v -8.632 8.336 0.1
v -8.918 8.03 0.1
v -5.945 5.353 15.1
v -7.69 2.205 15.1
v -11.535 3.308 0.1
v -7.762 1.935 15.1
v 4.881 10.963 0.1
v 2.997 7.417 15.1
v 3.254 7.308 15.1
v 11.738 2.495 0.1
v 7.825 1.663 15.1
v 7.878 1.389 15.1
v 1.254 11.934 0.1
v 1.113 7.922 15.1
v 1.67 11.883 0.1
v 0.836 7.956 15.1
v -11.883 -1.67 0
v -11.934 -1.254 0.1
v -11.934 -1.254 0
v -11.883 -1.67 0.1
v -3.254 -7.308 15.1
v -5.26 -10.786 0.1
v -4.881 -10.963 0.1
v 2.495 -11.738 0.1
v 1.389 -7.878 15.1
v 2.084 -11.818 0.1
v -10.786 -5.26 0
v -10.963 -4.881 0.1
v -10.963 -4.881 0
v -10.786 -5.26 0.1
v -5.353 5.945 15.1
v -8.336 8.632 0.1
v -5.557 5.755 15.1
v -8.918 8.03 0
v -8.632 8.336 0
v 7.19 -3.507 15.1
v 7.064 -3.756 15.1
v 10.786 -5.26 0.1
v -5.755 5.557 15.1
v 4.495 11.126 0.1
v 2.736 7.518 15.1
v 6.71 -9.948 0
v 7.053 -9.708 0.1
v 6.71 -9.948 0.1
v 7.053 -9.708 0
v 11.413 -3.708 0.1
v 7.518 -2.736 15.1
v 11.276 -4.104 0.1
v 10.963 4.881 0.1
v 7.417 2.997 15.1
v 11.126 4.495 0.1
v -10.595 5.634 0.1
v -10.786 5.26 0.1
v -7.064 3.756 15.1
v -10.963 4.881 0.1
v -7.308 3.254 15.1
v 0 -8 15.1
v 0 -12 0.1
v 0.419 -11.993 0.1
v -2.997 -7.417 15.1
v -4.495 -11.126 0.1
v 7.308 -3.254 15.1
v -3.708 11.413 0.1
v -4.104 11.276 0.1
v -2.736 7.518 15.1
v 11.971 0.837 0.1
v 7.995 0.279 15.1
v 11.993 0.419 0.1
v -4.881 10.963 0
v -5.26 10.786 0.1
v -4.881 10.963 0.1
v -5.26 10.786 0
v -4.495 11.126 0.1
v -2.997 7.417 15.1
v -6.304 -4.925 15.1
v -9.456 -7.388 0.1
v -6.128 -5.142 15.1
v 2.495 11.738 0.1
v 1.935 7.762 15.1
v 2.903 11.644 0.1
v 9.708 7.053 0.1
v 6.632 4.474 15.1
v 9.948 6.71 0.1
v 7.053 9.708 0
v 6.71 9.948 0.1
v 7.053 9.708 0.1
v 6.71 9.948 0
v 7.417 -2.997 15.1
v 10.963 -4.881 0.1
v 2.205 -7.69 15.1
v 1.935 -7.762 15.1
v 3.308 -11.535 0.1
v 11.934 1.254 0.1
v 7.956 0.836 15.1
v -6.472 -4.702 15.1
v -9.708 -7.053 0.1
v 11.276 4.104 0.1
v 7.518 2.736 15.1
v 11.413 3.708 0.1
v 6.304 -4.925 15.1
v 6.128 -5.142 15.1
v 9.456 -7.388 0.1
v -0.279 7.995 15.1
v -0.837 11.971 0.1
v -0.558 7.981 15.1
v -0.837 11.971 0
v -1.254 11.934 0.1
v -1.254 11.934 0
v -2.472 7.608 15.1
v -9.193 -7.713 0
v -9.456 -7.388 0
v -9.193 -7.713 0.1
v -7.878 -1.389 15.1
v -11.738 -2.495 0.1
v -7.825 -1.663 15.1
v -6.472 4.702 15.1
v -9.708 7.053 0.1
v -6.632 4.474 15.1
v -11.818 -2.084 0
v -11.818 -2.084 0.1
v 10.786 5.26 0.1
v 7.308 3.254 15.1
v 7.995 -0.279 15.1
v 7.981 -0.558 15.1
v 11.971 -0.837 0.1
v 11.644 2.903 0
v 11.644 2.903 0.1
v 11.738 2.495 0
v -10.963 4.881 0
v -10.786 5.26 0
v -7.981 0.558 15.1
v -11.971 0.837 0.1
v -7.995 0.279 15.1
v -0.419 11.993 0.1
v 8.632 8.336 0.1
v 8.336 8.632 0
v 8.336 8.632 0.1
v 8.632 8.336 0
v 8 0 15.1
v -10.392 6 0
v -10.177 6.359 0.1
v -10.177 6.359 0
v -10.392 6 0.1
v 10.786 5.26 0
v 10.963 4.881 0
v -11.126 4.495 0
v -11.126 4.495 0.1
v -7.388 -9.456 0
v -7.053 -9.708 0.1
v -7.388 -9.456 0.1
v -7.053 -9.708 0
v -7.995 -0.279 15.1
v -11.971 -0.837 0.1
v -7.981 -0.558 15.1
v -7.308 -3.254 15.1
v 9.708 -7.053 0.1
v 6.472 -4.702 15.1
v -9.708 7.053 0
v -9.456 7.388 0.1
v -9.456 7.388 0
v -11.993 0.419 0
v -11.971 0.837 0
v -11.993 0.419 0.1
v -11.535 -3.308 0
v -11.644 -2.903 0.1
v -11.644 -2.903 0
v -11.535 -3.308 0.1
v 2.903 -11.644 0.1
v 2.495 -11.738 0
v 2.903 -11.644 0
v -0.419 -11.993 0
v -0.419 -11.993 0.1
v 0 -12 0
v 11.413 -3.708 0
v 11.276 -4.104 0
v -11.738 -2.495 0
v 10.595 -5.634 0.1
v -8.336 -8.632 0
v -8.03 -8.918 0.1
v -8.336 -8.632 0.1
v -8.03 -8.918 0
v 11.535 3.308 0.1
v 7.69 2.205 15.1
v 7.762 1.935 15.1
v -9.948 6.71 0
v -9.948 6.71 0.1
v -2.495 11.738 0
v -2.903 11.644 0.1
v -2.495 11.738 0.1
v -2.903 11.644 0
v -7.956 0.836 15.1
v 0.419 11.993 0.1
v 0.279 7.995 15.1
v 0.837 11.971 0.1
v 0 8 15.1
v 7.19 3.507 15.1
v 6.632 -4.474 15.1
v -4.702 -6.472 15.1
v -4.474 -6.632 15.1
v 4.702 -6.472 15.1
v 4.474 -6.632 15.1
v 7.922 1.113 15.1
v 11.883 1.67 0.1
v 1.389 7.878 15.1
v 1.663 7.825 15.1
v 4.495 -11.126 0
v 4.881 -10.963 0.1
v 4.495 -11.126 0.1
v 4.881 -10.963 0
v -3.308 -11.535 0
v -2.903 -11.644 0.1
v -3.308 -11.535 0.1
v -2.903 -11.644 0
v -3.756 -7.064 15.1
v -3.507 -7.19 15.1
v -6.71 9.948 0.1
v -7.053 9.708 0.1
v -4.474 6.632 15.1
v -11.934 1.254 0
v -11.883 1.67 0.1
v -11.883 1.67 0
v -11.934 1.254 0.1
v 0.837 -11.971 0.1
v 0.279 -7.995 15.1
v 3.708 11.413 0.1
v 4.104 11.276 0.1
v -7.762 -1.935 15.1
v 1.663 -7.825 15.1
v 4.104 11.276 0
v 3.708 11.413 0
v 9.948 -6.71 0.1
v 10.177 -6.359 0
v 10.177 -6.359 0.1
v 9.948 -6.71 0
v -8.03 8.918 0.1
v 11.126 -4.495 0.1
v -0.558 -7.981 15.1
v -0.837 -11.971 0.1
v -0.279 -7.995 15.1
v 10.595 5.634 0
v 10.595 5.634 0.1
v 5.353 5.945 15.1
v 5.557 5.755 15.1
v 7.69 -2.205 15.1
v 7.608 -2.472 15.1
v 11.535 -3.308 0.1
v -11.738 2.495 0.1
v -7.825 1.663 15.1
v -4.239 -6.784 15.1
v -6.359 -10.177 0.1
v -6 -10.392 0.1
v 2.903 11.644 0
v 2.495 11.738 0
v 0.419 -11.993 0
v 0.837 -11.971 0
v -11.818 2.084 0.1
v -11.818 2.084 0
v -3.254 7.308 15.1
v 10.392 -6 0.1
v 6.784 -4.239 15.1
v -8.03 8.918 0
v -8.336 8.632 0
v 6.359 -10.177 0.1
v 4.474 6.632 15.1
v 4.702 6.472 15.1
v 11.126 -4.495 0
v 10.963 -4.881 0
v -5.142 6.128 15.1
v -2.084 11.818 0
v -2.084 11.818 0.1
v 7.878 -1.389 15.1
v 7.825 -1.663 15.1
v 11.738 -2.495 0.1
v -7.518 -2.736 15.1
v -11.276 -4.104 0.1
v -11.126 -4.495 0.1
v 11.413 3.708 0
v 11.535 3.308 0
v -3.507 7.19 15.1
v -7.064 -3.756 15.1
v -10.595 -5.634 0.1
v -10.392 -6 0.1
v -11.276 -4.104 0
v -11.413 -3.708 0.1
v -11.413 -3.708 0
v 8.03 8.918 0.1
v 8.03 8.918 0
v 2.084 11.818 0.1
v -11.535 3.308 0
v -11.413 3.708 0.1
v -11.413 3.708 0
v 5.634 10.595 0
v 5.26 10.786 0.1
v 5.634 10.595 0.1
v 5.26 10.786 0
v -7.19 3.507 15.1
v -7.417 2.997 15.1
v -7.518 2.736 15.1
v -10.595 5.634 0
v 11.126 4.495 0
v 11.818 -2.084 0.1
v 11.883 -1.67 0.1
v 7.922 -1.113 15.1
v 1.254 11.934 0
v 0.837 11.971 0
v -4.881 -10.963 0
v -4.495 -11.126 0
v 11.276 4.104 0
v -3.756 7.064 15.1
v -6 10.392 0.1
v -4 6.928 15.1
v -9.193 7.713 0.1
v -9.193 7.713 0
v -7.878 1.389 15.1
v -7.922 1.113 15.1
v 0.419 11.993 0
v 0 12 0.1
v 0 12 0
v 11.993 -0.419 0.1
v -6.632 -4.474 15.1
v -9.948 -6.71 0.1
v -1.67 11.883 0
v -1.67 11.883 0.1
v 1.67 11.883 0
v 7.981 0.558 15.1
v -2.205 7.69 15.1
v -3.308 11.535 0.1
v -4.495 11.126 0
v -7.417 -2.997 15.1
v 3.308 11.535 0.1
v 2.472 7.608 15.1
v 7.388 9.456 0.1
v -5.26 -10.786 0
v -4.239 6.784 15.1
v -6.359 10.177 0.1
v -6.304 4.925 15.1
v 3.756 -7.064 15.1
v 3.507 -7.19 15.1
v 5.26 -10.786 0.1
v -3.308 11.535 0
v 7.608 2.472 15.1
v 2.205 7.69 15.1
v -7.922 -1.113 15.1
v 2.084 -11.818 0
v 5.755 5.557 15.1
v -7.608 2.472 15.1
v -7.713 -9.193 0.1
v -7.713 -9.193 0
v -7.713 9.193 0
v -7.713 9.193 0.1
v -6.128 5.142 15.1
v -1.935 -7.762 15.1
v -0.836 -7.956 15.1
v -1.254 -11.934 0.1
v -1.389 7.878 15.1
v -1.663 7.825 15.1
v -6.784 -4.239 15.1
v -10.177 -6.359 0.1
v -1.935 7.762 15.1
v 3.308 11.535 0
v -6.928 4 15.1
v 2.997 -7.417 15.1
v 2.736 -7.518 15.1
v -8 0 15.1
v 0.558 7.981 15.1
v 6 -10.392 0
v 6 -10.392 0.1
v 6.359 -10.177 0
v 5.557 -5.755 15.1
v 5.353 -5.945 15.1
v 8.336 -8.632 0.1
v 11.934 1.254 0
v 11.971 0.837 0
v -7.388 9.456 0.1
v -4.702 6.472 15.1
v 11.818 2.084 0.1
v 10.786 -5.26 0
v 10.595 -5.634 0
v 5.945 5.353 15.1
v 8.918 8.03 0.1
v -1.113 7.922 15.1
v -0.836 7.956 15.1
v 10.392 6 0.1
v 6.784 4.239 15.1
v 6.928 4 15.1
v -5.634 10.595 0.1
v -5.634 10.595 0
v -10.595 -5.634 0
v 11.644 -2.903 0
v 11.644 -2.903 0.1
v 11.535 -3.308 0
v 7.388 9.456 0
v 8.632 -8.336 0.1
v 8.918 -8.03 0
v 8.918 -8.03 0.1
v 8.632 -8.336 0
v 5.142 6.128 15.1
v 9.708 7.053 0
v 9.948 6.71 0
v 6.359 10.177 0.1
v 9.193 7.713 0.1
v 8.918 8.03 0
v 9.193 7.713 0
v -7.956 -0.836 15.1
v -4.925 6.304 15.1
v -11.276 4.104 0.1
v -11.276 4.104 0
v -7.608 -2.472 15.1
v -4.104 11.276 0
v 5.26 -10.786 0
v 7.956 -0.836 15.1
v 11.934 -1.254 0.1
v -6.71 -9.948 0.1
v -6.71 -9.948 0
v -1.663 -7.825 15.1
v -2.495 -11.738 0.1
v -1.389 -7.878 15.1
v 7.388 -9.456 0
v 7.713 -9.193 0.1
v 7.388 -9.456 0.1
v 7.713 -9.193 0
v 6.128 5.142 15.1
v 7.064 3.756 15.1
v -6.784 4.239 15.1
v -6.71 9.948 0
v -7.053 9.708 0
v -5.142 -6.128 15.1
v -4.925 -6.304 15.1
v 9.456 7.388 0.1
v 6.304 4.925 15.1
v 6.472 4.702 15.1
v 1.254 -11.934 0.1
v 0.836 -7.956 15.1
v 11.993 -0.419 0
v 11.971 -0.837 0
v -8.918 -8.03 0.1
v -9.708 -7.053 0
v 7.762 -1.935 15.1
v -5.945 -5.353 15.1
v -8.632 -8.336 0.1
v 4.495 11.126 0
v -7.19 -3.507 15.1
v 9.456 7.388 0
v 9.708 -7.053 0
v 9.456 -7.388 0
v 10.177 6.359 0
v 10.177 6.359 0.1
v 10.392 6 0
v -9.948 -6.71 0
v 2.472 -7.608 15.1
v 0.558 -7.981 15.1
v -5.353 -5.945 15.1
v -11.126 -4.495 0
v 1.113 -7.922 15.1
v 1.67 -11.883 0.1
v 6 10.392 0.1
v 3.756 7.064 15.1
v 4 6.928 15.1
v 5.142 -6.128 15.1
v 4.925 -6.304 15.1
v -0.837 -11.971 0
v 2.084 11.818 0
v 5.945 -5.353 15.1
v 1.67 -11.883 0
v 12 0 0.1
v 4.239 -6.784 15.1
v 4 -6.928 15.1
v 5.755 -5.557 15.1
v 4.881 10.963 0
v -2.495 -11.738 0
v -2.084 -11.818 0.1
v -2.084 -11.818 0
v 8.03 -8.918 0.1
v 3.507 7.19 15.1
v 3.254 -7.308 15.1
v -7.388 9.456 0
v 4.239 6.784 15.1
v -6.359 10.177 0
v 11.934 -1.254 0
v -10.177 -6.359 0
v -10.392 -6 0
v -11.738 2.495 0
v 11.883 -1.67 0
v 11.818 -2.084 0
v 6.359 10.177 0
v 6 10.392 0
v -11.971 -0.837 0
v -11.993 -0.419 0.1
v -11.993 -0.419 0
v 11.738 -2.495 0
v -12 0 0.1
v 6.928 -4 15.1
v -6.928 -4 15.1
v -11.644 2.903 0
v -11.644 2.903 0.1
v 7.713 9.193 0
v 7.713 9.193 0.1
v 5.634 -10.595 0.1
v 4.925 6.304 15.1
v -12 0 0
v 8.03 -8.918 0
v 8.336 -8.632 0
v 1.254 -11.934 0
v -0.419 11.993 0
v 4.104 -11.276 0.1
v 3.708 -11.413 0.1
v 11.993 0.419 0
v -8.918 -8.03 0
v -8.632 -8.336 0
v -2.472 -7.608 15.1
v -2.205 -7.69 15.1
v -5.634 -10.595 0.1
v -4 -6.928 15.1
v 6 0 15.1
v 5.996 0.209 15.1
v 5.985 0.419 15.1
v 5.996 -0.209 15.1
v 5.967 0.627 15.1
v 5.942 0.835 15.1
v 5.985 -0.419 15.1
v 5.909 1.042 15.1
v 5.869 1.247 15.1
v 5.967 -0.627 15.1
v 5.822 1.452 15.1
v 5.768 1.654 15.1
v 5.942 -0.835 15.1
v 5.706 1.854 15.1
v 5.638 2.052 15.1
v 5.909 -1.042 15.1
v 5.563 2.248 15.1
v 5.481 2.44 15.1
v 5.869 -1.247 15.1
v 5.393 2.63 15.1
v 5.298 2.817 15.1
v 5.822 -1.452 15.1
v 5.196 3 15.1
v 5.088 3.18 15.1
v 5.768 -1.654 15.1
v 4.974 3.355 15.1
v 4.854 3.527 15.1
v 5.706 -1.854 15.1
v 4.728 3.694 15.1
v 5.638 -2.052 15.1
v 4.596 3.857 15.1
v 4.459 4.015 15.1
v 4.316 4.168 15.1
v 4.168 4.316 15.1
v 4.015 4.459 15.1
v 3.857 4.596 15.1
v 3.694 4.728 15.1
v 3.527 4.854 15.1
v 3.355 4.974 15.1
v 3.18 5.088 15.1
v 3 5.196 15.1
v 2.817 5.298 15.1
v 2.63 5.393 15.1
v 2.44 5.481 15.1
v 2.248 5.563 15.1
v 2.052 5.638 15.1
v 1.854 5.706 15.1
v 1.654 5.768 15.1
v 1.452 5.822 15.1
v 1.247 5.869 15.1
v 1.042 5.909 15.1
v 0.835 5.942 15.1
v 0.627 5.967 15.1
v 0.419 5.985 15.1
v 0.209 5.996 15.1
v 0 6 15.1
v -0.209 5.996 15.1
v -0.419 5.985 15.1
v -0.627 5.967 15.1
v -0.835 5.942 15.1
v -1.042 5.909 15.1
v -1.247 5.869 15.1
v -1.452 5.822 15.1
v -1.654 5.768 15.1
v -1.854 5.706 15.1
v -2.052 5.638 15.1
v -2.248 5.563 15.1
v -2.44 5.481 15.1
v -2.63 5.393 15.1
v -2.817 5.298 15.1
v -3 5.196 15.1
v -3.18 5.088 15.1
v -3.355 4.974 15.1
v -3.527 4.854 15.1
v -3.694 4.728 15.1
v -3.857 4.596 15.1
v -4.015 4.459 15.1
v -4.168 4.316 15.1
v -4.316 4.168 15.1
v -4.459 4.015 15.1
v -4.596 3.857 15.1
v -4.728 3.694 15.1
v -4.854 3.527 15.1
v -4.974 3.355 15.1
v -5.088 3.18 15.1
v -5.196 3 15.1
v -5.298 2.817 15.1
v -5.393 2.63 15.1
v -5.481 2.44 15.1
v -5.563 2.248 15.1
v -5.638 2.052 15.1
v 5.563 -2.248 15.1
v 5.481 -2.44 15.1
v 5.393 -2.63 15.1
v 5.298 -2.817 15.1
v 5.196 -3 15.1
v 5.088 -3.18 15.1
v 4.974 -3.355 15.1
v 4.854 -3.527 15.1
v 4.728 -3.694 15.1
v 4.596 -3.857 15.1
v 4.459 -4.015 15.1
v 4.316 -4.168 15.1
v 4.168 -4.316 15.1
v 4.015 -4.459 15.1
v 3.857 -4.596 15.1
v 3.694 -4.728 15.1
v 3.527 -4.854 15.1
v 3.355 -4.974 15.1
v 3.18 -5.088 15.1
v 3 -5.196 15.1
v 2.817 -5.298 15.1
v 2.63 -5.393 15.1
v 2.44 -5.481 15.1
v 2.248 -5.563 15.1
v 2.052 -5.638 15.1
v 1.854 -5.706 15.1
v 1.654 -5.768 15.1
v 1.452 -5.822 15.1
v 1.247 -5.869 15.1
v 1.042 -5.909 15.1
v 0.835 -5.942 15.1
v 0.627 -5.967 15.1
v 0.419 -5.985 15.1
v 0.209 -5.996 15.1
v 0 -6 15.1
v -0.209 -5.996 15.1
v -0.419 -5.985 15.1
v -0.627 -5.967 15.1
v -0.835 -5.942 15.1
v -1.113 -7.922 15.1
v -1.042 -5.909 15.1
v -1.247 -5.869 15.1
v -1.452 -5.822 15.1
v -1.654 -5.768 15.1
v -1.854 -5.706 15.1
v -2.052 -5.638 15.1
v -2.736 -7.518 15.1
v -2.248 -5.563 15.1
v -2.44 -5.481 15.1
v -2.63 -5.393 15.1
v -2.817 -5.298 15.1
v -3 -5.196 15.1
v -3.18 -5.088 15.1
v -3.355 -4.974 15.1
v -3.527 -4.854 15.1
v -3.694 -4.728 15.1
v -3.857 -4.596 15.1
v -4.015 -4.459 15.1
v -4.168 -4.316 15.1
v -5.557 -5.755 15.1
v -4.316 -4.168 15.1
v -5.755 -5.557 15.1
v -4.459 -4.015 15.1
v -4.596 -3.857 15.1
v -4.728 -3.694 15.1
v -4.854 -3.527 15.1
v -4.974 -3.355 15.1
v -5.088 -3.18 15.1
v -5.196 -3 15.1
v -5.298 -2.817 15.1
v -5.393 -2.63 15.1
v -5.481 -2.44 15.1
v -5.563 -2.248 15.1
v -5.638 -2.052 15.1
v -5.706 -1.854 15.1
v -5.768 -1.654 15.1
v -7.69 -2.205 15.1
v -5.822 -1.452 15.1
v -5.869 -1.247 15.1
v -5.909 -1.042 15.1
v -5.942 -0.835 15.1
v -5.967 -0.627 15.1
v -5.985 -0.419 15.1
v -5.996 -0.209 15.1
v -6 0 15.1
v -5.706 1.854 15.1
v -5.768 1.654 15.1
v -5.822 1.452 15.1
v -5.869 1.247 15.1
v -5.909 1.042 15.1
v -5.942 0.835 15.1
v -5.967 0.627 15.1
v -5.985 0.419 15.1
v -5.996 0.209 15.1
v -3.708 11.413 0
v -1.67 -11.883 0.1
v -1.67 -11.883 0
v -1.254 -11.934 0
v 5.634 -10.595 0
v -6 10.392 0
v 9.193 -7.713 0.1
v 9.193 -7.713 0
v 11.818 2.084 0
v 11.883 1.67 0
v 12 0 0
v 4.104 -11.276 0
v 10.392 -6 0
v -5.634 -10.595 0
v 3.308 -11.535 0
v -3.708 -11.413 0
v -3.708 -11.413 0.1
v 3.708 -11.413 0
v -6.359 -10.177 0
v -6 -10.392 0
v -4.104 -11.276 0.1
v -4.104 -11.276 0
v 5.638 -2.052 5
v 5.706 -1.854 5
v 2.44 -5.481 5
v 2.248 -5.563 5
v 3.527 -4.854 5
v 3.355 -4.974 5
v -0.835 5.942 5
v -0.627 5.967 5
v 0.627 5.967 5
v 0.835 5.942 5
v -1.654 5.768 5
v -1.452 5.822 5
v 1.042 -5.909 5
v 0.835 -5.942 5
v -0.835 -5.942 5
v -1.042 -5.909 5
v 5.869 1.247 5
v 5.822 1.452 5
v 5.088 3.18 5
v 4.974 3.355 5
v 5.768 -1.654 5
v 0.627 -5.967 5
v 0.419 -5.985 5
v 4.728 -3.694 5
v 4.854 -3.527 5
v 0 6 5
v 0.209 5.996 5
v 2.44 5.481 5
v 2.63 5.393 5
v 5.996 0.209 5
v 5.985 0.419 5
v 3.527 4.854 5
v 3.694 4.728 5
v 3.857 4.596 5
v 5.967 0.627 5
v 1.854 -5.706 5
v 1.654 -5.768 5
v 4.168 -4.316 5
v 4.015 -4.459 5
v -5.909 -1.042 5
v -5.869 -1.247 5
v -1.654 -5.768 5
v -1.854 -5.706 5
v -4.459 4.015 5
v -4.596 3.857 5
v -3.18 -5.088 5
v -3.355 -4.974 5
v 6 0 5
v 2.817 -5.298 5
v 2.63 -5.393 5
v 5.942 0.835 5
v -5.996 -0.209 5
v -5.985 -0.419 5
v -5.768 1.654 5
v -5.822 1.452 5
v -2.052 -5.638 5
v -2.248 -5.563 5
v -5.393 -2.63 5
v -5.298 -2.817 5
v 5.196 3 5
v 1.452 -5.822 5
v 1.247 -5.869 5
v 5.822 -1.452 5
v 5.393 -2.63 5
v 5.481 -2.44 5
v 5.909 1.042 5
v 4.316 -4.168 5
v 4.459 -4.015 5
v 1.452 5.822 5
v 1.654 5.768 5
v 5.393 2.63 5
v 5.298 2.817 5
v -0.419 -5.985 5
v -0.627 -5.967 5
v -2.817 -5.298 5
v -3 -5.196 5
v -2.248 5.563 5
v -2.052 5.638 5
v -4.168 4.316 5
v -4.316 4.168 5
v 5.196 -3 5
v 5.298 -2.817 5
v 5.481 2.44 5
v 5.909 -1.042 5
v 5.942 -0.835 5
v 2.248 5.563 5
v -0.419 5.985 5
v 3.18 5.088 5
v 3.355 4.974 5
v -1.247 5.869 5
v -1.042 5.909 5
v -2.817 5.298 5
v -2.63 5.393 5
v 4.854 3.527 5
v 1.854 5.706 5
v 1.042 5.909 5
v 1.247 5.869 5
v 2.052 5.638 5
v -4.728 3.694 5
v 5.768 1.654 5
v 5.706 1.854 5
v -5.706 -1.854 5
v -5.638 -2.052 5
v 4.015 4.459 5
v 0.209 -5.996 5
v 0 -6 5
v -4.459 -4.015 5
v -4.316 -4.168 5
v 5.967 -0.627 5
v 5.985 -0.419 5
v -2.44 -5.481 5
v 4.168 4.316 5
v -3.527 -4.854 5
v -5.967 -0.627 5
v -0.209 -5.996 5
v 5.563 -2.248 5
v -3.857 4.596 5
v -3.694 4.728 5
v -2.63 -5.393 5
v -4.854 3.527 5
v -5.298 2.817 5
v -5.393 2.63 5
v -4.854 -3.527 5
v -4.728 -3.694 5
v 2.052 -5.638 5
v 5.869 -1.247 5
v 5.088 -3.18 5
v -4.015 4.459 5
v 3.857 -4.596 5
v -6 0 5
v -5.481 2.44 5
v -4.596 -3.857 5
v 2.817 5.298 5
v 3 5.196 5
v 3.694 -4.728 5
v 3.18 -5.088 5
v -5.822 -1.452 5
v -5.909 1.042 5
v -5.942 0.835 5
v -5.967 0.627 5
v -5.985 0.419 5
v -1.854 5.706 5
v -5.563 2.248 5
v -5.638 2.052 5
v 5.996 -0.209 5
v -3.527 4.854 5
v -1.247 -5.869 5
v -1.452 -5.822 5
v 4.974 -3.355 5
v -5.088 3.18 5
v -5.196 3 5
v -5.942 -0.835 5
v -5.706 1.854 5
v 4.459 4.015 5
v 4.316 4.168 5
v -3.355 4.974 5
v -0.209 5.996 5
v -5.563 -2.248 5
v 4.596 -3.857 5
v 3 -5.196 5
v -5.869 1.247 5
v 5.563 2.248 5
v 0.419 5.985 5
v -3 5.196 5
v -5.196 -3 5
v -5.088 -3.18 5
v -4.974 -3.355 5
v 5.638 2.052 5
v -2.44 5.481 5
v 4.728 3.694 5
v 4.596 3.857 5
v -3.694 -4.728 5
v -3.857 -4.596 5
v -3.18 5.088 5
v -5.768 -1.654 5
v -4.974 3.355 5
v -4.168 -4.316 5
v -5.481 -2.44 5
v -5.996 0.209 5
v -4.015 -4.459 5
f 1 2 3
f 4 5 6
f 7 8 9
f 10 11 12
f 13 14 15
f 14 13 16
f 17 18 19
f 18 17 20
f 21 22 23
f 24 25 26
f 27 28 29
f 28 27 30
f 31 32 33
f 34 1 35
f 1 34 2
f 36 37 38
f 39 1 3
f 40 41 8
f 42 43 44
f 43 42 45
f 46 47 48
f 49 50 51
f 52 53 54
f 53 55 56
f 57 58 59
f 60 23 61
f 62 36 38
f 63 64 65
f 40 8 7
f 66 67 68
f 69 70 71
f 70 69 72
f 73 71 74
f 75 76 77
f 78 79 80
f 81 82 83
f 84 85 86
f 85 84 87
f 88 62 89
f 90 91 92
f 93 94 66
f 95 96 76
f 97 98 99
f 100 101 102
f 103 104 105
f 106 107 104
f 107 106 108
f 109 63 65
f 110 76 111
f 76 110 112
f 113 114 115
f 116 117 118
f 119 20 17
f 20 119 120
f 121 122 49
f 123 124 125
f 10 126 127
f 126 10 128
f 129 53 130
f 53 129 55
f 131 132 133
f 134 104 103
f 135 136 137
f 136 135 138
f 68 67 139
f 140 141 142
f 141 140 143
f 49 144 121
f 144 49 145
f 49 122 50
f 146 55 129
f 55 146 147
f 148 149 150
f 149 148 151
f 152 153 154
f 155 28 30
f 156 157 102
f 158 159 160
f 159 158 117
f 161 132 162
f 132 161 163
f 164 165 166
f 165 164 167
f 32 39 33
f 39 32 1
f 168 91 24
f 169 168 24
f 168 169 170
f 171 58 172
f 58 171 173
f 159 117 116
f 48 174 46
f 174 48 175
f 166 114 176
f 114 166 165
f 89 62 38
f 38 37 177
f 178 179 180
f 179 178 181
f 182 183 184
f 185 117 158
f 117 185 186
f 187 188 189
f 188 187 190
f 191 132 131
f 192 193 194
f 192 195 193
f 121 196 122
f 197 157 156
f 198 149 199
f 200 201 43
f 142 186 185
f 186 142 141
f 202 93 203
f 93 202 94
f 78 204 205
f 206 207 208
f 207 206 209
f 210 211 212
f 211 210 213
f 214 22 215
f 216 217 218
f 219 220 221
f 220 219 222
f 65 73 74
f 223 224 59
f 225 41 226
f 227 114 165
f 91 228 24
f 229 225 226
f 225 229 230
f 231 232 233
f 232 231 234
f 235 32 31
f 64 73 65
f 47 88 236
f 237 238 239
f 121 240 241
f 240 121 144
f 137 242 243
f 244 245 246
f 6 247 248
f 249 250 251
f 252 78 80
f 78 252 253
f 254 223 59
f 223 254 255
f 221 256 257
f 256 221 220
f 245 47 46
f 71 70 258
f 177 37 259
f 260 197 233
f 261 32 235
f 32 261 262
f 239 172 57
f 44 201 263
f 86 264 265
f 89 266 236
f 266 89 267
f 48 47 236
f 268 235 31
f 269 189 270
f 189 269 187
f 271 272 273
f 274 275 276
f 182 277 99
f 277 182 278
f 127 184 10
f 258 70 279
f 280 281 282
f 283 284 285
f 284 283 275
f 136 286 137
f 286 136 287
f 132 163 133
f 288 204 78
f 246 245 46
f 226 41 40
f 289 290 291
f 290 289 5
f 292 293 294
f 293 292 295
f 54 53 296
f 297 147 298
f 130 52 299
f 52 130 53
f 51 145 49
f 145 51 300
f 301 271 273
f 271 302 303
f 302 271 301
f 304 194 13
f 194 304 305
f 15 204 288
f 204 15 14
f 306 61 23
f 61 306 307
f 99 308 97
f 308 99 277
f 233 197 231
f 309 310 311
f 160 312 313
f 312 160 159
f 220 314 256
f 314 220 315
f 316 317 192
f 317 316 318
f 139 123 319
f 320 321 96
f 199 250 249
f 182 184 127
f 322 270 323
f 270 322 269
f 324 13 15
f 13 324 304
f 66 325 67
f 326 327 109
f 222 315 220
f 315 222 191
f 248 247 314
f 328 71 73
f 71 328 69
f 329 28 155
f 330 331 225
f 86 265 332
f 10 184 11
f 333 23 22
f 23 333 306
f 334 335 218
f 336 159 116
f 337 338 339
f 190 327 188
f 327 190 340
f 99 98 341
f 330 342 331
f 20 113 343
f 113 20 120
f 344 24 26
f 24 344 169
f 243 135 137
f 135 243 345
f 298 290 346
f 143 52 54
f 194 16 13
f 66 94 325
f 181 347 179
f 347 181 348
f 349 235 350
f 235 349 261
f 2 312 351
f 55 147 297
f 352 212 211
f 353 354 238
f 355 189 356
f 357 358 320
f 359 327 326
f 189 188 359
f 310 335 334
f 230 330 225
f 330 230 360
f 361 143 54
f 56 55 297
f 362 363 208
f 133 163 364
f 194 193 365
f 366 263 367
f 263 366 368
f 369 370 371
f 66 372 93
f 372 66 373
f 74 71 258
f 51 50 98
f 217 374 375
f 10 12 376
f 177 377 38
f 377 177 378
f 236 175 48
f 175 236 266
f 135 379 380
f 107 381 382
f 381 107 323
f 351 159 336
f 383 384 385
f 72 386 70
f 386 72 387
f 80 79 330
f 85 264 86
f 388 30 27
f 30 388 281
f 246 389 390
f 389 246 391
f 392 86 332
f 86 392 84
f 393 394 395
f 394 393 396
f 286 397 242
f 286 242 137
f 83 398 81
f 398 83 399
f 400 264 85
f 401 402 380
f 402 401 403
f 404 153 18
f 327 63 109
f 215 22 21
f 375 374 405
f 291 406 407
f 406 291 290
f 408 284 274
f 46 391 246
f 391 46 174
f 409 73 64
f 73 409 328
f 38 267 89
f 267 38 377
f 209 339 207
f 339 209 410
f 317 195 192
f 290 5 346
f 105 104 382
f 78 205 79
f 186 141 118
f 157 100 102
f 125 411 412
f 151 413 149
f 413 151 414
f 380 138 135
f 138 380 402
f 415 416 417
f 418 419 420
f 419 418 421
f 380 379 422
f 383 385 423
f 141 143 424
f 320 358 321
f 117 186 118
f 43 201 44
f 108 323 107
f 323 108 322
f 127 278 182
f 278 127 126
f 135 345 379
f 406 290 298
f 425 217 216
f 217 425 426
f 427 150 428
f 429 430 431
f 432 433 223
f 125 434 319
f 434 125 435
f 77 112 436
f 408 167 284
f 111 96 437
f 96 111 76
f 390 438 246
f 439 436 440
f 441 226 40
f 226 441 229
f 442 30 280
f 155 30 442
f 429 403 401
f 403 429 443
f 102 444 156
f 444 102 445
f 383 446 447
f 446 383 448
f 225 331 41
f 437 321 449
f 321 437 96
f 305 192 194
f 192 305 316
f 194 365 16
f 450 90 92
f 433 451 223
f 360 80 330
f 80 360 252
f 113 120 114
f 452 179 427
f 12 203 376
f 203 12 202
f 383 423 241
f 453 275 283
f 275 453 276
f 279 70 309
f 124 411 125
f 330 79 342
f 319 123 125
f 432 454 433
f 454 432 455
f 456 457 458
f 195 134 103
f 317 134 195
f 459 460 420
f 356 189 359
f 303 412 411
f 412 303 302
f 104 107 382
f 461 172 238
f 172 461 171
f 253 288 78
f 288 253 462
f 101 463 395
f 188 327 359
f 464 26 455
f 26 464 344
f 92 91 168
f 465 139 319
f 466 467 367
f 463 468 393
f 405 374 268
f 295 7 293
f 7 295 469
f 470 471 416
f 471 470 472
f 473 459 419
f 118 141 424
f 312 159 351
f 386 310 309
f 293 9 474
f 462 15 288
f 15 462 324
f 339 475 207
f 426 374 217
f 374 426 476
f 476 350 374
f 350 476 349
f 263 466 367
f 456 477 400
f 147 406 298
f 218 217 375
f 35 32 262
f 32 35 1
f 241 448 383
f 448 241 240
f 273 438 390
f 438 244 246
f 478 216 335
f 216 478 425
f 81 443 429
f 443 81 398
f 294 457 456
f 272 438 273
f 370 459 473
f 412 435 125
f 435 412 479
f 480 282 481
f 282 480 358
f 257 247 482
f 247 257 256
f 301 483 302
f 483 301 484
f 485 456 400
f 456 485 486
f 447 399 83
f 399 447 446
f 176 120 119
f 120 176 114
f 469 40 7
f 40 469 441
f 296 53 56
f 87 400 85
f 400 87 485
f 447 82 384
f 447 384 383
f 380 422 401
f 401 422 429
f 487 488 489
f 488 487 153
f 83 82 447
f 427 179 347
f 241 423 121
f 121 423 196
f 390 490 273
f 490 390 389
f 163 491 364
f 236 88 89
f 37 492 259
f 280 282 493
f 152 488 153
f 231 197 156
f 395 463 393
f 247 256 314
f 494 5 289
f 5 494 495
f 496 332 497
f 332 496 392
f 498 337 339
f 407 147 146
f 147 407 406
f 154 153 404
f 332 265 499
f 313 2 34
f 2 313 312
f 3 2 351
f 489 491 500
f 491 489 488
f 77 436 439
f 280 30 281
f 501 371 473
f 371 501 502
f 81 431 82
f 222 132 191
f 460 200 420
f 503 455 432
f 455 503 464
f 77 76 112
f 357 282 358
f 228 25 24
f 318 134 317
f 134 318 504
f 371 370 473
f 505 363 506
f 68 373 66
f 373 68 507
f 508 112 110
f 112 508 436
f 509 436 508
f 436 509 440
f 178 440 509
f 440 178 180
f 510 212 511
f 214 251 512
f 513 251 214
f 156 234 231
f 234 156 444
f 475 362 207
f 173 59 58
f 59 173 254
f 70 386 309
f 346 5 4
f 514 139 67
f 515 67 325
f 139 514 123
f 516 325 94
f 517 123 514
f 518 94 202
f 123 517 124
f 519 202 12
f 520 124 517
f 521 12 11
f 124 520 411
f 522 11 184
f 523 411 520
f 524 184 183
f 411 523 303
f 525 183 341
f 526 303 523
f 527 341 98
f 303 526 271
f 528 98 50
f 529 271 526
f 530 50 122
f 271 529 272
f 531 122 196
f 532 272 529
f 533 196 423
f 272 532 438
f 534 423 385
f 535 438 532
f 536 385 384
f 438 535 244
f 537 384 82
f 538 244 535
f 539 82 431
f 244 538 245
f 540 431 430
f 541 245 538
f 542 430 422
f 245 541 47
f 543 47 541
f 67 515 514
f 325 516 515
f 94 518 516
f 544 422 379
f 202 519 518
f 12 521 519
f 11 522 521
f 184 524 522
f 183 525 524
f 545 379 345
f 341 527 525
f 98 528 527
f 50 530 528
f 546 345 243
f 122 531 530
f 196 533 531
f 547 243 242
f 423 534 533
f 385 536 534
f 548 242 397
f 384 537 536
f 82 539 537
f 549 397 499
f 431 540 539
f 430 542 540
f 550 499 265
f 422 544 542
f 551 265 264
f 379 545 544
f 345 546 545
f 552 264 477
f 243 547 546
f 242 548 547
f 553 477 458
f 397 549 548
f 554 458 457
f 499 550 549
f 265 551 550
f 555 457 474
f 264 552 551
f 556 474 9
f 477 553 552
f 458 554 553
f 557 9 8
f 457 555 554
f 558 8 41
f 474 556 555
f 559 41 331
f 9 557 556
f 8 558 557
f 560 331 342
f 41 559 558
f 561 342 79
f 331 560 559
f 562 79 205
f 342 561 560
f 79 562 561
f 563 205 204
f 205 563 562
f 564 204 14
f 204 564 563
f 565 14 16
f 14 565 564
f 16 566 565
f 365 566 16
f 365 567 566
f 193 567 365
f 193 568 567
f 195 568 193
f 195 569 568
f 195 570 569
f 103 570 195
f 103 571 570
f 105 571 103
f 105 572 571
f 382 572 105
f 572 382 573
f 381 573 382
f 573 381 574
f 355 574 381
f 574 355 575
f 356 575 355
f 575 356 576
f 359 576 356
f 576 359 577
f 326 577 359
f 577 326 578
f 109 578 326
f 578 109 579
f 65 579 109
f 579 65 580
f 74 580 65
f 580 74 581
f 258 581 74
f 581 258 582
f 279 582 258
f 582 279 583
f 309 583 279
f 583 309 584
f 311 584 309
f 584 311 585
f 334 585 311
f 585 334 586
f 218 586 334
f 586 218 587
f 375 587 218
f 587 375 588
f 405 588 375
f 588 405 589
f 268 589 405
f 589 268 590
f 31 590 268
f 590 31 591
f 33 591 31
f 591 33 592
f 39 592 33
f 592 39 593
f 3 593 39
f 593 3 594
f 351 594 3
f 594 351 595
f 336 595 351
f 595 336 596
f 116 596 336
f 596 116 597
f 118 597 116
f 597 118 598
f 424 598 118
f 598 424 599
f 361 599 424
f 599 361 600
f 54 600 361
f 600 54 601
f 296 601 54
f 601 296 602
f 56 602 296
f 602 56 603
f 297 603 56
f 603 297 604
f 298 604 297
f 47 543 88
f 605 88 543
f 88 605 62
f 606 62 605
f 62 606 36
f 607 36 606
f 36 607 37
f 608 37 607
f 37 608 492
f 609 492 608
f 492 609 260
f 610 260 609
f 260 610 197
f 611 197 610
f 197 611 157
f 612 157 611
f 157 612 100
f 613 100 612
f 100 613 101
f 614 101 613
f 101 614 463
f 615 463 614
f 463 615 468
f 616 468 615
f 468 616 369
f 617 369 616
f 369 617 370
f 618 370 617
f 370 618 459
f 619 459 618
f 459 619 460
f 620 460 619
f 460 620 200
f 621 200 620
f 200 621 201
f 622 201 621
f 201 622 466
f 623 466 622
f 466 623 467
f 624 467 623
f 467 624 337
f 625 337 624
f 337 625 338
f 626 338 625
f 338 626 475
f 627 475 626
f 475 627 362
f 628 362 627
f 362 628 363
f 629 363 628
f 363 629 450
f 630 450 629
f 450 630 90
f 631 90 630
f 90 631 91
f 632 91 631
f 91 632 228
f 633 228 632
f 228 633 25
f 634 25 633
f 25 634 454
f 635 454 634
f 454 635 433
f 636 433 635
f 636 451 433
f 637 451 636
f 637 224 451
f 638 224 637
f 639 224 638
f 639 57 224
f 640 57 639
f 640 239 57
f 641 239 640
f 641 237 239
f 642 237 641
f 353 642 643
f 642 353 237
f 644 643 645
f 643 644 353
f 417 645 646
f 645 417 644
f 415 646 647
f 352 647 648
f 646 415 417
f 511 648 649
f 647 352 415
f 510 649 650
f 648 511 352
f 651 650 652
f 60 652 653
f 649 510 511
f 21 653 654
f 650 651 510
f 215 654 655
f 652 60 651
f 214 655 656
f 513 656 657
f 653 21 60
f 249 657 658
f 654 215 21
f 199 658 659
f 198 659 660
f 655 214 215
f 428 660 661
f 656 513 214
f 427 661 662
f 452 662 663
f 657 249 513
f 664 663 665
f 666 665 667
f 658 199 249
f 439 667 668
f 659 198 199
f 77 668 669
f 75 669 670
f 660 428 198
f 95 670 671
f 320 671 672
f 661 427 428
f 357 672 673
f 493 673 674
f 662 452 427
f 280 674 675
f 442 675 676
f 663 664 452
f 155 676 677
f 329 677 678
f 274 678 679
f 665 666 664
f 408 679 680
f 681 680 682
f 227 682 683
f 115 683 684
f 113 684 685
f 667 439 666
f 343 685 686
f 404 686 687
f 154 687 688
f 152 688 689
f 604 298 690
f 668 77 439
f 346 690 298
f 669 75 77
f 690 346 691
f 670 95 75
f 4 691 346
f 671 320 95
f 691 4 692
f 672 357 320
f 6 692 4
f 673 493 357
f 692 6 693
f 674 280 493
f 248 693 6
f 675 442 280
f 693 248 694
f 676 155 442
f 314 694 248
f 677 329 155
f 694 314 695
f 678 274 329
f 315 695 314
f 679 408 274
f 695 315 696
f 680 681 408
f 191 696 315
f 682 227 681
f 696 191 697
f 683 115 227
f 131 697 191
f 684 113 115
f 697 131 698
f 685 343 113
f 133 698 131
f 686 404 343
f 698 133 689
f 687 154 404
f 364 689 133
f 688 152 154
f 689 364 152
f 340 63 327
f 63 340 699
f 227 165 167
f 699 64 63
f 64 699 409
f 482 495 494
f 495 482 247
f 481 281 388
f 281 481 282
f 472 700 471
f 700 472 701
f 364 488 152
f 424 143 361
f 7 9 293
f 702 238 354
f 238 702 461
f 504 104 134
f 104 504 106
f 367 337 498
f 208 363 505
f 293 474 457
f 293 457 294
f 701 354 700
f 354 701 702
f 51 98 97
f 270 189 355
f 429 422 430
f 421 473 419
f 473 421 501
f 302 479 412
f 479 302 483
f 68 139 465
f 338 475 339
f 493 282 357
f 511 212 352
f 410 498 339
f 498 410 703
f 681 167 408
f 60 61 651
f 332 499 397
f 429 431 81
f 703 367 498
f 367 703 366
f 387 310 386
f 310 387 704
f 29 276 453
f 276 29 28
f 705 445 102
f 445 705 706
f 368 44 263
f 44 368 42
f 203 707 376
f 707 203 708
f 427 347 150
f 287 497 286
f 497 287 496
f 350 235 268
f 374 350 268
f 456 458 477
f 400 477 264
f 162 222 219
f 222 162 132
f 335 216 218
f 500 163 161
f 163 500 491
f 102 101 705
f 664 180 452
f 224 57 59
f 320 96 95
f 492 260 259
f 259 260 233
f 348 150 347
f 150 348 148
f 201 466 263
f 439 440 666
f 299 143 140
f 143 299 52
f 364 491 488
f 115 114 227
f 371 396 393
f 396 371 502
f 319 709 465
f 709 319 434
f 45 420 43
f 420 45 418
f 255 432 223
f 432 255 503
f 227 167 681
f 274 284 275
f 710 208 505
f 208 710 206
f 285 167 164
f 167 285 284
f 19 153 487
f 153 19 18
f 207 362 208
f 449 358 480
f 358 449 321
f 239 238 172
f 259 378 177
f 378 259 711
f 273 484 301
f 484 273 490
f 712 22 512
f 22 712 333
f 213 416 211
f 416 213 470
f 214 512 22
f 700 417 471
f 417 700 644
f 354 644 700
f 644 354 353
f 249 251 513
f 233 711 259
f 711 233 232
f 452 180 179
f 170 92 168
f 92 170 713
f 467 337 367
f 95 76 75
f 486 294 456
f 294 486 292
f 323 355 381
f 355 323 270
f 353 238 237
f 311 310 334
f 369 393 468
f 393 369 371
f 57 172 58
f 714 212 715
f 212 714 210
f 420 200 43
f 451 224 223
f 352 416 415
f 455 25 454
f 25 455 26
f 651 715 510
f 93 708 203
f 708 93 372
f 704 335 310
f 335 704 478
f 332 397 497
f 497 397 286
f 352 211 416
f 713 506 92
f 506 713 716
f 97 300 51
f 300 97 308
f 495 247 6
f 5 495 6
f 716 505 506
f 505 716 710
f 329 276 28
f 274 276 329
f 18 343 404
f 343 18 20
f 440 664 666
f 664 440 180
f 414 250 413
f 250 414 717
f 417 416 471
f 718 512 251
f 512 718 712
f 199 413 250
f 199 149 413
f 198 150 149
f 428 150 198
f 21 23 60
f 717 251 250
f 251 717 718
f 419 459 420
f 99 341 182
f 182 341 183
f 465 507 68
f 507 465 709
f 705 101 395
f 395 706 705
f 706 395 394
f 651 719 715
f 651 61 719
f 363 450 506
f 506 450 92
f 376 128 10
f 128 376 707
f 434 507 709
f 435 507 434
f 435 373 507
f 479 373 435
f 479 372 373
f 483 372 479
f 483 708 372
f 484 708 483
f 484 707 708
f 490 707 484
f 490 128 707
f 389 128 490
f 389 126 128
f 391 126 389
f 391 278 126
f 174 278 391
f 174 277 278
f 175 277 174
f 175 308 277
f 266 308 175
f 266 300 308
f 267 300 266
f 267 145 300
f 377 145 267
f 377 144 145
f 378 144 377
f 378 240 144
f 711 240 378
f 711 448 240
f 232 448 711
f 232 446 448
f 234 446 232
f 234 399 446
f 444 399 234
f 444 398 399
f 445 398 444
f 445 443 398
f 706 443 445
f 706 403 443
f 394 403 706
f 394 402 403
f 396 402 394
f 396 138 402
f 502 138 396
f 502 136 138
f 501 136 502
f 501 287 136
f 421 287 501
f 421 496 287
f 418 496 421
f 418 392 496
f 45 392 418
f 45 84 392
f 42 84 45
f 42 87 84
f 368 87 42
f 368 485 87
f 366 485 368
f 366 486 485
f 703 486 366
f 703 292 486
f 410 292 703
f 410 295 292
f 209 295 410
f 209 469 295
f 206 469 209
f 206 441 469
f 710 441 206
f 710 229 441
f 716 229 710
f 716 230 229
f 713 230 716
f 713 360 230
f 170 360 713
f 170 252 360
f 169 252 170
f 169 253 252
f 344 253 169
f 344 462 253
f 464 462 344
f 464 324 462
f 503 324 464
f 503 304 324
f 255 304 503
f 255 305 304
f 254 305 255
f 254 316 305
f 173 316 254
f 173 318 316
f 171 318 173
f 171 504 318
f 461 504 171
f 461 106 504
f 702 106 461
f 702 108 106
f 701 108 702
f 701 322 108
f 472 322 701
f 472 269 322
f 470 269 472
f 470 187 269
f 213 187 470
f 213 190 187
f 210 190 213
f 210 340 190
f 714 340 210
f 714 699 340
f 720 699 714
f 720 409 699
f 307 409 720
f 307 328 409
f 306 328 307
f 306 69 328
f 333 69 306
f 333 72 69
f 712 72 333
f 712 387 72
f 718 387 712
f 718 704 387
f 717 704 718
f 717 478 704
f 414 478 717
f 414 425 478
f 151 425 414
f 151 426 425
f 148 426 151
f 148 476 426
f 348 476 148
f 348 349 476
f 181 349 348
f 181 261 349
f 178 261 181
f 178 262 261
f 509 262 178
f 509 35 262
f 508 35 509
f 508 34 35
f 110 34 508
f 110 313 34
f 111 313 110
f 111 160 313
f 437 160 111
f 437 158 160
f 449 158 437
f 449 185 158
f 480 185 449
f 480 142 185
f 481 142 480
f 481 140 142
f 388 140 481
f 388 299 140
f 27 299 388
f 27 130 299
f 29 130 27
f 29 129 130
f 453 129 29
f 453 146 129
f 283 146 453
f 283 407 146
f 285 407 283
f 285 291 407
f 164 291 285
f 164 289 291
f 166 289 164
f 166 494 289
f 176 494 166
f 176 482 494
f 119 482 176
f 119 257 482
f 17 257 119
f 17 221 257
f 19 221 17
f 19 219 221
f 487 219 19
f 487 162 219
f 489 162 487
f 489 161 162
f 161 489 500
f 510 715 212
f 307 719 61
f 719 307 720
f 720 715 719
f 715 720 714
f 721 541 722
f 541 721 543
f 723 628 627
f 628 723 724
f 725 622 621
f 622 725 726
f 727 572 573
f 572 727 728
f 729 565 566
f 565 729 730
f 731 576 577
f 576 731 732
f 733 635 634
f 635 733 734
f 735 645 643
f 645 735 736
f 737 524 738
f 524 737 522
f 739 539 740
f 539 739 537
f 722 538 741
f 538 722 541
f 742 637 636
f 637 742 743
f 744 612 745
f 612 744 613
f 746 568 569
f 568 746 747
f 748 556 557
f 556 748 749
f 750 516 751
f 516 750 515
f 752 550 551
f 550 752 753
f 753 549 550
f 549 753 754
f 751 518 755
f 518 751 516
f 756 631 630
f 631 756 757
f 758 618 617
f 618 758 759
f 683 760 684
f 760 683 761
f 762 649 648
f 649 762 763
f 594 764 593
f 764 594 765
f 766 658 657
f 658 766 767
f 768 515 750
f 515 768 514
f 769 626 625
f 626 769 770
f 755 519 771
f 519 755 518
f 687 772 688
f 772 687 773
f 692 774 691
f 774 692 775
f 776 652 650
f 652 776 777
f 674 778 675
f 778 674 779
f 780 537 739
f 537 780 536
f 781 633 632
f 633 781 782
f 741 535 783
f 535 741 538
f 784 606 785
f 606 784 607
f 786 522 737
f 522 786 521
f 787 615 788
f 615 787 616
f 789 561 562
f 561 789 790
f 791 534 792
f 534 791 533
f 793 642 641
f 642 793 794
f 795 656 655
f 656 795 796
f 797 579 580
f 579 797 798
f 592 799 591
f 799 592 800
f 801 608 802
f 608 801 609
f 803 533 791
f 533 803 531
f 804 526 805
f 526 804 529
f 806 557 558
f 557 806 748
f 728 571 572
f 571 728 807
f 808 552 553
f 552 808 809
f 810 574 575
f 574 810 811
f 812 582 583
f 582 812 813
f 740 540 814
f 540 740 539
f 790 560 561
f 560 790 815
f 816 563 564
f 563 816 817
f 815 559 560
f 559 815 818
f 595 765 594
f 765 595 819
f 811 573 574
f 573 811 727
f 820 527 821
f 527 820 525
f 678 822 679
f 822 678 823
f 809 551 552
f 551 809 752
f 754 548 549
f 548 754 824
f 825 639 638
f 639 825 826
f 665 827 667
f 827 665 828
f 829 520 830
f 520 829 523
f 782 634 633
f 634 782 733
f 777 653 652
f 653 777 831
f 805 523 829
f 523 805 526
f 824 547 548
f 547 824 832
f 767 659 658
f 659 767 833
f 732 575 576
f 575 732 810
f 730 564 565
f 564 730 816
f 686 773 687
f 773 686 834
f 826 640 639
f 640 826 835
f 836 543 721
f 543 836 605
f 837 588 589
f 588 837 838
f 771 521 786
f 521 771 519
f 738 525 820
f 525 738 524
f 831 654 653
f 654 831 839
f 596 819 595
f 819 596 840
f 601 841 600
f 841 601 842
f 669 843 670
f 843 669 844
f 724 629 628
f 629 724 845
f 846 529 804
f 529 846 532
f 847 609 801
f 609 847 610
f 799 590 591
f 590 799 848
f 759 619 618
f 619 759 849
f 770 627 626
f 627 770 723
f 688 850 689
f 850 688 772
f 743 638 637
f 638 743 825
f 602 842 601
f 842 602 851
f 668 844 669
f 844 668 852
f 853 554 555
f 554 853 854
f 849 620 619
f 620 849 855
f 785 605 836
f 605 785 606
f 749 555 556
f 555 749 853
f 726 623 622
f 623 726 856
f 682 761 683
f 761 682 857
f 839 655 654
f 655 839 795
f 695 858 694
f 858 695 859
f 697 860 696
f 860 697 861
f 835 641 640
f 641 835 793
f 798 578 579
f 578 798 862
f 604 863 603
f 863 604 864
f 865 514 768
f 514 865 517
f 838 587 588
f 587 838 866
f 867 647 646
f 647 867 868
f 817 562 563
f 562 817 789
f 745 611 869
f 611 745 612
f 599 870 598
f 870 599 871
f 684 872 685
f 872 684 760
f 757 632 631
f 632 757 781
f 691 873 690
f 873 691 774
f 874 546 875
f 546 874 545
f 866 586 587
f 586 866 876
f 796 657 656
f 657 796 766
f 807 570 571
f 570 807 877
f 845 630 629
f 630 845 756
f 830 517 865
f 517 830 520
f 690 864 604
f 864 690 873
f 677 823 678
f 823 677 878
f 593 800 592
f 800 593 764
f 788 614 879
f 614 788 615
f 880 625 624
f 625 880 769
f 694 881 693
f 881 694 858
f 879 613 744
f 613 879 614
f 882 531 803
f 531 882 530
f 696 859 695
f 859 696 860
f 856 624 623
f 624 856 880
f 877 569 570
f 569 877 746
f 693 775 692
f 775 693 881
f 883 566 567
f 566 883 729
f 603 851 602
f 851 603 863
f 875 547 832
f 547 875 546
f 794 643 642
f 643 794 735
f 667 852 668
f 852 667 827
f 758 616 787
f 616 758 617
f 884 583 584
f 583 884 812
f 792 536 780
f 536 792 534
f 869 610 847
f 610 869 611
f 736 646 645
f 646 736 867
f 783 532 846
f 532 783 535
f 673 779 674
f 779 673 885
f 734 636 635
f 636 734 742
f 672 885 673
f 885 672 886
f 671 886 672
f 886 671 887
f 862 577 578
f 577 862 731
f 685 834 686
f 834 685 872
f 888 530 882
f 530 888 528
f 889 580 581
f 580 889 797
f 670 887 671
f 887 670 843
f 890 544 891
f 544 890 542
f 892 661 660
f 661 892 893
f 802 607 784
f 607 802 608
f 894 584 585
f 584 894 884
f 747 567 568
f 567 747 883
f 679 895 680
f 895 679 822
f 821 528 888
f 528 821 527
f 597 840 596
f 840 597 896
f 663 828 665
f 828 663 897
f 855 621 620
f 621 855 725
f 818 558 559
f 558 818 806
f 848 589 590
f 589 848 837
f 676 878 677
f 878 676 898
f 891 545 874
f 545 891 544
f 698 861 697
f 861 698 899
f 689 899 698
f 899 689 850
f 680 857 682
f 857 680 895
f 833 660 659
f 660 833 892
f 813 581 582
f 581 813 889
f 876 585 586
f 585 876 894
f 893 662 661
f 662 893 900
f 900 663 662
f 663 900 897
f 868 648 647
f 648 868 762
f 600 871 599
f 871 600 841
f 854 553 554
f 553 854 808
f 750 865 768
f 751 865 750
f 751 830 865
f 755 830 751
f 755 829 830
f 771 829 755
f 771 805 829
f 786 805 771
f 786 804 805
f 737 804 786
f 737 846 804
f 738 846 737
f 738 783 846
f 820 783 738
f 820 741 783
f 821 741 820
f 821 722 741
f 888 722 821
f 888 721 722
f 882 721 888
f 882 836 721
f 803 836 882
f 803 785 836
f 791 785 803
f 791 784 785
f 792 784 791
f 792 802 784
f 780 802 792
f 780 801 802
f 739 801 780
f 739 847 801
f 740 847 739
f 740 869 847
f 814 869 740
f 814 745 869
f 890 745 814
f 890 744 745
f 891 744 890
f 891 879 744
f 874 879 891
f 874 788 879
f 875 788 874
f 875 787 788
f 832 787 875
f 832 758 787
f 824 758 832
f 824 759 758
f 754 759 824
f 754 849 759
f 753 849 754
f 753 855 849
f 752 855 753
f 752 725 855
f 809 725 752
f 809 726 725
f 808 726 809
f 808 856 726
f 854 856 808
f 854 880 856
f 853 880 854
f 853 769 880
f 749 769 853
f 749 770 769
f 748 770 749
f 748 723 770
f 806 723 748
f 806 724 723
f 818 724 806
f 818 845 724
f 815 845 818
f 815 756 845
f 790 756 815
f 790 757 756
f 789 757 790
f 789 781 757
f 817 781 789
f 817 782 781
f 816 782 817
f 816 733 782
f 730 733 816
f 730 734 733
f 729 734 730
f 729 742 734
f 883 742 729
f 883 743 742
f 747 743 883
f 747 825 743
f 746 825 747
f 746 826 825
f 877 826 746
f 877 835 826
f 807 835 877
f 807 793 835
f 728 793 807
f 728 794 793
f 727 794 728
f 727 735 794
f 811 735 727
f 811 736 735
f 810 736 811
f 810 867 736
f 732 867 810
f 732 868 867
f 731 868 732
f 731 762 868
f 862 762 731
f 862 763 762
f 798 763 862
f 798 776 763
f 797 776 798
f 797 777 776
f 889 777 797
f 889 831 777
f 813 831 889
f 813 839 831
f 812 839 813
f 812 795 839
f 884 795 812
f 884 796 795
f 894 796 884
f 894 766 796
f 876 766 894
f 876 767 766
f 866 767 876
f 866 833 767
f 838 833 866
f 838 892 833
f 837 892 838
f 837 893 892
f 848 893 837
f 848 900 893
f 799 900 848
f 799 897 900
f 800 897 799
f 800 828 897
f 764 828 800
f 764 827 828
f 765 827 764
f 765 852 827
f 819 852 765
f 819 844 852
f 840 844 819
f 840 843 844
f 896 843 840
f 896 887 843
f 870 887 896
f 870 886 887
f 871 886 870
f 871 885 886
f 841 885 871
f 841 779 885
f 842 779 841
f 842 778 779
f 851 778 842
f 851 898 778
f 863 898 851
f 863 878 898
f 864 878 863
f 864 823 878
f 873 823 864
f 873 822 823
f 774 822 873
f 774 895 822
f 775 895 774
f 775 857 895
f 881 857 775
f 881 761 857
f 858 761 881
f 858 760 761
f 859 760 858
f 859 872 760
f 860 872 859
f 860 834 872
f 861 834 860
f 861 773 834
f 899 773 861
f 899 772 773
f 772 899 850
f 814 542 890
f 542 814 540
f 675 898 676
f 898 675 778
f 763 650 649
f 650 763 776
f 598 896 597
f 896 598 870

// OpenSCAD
/*
Simple test holder for a perfume 
spritzer bottle.

OD should be ~11mm. 
*/

$fs = .2;
$fa = 2;

module PerfumeHolder() {
    // Diameter of bottle's hole
    hole_d = 12;
    thick = 4;
    bottom_d = hole_d * 2;
    top_d = hole_d + thick;
    height = 15;
    module base() {
        hull() {
            cylinder(h=0.1, r = bottom_d/2);
            translate([0,0,15])
            cylinder(h=0.1, r=top_d/2);
        }
    }
    module hole() {
        translate([0,0,5])
            cylinder(h=height+2,r=hole_d/2);
    }
    difference() {
        base();
        hole();
    }
}

PerfumeHolder();
